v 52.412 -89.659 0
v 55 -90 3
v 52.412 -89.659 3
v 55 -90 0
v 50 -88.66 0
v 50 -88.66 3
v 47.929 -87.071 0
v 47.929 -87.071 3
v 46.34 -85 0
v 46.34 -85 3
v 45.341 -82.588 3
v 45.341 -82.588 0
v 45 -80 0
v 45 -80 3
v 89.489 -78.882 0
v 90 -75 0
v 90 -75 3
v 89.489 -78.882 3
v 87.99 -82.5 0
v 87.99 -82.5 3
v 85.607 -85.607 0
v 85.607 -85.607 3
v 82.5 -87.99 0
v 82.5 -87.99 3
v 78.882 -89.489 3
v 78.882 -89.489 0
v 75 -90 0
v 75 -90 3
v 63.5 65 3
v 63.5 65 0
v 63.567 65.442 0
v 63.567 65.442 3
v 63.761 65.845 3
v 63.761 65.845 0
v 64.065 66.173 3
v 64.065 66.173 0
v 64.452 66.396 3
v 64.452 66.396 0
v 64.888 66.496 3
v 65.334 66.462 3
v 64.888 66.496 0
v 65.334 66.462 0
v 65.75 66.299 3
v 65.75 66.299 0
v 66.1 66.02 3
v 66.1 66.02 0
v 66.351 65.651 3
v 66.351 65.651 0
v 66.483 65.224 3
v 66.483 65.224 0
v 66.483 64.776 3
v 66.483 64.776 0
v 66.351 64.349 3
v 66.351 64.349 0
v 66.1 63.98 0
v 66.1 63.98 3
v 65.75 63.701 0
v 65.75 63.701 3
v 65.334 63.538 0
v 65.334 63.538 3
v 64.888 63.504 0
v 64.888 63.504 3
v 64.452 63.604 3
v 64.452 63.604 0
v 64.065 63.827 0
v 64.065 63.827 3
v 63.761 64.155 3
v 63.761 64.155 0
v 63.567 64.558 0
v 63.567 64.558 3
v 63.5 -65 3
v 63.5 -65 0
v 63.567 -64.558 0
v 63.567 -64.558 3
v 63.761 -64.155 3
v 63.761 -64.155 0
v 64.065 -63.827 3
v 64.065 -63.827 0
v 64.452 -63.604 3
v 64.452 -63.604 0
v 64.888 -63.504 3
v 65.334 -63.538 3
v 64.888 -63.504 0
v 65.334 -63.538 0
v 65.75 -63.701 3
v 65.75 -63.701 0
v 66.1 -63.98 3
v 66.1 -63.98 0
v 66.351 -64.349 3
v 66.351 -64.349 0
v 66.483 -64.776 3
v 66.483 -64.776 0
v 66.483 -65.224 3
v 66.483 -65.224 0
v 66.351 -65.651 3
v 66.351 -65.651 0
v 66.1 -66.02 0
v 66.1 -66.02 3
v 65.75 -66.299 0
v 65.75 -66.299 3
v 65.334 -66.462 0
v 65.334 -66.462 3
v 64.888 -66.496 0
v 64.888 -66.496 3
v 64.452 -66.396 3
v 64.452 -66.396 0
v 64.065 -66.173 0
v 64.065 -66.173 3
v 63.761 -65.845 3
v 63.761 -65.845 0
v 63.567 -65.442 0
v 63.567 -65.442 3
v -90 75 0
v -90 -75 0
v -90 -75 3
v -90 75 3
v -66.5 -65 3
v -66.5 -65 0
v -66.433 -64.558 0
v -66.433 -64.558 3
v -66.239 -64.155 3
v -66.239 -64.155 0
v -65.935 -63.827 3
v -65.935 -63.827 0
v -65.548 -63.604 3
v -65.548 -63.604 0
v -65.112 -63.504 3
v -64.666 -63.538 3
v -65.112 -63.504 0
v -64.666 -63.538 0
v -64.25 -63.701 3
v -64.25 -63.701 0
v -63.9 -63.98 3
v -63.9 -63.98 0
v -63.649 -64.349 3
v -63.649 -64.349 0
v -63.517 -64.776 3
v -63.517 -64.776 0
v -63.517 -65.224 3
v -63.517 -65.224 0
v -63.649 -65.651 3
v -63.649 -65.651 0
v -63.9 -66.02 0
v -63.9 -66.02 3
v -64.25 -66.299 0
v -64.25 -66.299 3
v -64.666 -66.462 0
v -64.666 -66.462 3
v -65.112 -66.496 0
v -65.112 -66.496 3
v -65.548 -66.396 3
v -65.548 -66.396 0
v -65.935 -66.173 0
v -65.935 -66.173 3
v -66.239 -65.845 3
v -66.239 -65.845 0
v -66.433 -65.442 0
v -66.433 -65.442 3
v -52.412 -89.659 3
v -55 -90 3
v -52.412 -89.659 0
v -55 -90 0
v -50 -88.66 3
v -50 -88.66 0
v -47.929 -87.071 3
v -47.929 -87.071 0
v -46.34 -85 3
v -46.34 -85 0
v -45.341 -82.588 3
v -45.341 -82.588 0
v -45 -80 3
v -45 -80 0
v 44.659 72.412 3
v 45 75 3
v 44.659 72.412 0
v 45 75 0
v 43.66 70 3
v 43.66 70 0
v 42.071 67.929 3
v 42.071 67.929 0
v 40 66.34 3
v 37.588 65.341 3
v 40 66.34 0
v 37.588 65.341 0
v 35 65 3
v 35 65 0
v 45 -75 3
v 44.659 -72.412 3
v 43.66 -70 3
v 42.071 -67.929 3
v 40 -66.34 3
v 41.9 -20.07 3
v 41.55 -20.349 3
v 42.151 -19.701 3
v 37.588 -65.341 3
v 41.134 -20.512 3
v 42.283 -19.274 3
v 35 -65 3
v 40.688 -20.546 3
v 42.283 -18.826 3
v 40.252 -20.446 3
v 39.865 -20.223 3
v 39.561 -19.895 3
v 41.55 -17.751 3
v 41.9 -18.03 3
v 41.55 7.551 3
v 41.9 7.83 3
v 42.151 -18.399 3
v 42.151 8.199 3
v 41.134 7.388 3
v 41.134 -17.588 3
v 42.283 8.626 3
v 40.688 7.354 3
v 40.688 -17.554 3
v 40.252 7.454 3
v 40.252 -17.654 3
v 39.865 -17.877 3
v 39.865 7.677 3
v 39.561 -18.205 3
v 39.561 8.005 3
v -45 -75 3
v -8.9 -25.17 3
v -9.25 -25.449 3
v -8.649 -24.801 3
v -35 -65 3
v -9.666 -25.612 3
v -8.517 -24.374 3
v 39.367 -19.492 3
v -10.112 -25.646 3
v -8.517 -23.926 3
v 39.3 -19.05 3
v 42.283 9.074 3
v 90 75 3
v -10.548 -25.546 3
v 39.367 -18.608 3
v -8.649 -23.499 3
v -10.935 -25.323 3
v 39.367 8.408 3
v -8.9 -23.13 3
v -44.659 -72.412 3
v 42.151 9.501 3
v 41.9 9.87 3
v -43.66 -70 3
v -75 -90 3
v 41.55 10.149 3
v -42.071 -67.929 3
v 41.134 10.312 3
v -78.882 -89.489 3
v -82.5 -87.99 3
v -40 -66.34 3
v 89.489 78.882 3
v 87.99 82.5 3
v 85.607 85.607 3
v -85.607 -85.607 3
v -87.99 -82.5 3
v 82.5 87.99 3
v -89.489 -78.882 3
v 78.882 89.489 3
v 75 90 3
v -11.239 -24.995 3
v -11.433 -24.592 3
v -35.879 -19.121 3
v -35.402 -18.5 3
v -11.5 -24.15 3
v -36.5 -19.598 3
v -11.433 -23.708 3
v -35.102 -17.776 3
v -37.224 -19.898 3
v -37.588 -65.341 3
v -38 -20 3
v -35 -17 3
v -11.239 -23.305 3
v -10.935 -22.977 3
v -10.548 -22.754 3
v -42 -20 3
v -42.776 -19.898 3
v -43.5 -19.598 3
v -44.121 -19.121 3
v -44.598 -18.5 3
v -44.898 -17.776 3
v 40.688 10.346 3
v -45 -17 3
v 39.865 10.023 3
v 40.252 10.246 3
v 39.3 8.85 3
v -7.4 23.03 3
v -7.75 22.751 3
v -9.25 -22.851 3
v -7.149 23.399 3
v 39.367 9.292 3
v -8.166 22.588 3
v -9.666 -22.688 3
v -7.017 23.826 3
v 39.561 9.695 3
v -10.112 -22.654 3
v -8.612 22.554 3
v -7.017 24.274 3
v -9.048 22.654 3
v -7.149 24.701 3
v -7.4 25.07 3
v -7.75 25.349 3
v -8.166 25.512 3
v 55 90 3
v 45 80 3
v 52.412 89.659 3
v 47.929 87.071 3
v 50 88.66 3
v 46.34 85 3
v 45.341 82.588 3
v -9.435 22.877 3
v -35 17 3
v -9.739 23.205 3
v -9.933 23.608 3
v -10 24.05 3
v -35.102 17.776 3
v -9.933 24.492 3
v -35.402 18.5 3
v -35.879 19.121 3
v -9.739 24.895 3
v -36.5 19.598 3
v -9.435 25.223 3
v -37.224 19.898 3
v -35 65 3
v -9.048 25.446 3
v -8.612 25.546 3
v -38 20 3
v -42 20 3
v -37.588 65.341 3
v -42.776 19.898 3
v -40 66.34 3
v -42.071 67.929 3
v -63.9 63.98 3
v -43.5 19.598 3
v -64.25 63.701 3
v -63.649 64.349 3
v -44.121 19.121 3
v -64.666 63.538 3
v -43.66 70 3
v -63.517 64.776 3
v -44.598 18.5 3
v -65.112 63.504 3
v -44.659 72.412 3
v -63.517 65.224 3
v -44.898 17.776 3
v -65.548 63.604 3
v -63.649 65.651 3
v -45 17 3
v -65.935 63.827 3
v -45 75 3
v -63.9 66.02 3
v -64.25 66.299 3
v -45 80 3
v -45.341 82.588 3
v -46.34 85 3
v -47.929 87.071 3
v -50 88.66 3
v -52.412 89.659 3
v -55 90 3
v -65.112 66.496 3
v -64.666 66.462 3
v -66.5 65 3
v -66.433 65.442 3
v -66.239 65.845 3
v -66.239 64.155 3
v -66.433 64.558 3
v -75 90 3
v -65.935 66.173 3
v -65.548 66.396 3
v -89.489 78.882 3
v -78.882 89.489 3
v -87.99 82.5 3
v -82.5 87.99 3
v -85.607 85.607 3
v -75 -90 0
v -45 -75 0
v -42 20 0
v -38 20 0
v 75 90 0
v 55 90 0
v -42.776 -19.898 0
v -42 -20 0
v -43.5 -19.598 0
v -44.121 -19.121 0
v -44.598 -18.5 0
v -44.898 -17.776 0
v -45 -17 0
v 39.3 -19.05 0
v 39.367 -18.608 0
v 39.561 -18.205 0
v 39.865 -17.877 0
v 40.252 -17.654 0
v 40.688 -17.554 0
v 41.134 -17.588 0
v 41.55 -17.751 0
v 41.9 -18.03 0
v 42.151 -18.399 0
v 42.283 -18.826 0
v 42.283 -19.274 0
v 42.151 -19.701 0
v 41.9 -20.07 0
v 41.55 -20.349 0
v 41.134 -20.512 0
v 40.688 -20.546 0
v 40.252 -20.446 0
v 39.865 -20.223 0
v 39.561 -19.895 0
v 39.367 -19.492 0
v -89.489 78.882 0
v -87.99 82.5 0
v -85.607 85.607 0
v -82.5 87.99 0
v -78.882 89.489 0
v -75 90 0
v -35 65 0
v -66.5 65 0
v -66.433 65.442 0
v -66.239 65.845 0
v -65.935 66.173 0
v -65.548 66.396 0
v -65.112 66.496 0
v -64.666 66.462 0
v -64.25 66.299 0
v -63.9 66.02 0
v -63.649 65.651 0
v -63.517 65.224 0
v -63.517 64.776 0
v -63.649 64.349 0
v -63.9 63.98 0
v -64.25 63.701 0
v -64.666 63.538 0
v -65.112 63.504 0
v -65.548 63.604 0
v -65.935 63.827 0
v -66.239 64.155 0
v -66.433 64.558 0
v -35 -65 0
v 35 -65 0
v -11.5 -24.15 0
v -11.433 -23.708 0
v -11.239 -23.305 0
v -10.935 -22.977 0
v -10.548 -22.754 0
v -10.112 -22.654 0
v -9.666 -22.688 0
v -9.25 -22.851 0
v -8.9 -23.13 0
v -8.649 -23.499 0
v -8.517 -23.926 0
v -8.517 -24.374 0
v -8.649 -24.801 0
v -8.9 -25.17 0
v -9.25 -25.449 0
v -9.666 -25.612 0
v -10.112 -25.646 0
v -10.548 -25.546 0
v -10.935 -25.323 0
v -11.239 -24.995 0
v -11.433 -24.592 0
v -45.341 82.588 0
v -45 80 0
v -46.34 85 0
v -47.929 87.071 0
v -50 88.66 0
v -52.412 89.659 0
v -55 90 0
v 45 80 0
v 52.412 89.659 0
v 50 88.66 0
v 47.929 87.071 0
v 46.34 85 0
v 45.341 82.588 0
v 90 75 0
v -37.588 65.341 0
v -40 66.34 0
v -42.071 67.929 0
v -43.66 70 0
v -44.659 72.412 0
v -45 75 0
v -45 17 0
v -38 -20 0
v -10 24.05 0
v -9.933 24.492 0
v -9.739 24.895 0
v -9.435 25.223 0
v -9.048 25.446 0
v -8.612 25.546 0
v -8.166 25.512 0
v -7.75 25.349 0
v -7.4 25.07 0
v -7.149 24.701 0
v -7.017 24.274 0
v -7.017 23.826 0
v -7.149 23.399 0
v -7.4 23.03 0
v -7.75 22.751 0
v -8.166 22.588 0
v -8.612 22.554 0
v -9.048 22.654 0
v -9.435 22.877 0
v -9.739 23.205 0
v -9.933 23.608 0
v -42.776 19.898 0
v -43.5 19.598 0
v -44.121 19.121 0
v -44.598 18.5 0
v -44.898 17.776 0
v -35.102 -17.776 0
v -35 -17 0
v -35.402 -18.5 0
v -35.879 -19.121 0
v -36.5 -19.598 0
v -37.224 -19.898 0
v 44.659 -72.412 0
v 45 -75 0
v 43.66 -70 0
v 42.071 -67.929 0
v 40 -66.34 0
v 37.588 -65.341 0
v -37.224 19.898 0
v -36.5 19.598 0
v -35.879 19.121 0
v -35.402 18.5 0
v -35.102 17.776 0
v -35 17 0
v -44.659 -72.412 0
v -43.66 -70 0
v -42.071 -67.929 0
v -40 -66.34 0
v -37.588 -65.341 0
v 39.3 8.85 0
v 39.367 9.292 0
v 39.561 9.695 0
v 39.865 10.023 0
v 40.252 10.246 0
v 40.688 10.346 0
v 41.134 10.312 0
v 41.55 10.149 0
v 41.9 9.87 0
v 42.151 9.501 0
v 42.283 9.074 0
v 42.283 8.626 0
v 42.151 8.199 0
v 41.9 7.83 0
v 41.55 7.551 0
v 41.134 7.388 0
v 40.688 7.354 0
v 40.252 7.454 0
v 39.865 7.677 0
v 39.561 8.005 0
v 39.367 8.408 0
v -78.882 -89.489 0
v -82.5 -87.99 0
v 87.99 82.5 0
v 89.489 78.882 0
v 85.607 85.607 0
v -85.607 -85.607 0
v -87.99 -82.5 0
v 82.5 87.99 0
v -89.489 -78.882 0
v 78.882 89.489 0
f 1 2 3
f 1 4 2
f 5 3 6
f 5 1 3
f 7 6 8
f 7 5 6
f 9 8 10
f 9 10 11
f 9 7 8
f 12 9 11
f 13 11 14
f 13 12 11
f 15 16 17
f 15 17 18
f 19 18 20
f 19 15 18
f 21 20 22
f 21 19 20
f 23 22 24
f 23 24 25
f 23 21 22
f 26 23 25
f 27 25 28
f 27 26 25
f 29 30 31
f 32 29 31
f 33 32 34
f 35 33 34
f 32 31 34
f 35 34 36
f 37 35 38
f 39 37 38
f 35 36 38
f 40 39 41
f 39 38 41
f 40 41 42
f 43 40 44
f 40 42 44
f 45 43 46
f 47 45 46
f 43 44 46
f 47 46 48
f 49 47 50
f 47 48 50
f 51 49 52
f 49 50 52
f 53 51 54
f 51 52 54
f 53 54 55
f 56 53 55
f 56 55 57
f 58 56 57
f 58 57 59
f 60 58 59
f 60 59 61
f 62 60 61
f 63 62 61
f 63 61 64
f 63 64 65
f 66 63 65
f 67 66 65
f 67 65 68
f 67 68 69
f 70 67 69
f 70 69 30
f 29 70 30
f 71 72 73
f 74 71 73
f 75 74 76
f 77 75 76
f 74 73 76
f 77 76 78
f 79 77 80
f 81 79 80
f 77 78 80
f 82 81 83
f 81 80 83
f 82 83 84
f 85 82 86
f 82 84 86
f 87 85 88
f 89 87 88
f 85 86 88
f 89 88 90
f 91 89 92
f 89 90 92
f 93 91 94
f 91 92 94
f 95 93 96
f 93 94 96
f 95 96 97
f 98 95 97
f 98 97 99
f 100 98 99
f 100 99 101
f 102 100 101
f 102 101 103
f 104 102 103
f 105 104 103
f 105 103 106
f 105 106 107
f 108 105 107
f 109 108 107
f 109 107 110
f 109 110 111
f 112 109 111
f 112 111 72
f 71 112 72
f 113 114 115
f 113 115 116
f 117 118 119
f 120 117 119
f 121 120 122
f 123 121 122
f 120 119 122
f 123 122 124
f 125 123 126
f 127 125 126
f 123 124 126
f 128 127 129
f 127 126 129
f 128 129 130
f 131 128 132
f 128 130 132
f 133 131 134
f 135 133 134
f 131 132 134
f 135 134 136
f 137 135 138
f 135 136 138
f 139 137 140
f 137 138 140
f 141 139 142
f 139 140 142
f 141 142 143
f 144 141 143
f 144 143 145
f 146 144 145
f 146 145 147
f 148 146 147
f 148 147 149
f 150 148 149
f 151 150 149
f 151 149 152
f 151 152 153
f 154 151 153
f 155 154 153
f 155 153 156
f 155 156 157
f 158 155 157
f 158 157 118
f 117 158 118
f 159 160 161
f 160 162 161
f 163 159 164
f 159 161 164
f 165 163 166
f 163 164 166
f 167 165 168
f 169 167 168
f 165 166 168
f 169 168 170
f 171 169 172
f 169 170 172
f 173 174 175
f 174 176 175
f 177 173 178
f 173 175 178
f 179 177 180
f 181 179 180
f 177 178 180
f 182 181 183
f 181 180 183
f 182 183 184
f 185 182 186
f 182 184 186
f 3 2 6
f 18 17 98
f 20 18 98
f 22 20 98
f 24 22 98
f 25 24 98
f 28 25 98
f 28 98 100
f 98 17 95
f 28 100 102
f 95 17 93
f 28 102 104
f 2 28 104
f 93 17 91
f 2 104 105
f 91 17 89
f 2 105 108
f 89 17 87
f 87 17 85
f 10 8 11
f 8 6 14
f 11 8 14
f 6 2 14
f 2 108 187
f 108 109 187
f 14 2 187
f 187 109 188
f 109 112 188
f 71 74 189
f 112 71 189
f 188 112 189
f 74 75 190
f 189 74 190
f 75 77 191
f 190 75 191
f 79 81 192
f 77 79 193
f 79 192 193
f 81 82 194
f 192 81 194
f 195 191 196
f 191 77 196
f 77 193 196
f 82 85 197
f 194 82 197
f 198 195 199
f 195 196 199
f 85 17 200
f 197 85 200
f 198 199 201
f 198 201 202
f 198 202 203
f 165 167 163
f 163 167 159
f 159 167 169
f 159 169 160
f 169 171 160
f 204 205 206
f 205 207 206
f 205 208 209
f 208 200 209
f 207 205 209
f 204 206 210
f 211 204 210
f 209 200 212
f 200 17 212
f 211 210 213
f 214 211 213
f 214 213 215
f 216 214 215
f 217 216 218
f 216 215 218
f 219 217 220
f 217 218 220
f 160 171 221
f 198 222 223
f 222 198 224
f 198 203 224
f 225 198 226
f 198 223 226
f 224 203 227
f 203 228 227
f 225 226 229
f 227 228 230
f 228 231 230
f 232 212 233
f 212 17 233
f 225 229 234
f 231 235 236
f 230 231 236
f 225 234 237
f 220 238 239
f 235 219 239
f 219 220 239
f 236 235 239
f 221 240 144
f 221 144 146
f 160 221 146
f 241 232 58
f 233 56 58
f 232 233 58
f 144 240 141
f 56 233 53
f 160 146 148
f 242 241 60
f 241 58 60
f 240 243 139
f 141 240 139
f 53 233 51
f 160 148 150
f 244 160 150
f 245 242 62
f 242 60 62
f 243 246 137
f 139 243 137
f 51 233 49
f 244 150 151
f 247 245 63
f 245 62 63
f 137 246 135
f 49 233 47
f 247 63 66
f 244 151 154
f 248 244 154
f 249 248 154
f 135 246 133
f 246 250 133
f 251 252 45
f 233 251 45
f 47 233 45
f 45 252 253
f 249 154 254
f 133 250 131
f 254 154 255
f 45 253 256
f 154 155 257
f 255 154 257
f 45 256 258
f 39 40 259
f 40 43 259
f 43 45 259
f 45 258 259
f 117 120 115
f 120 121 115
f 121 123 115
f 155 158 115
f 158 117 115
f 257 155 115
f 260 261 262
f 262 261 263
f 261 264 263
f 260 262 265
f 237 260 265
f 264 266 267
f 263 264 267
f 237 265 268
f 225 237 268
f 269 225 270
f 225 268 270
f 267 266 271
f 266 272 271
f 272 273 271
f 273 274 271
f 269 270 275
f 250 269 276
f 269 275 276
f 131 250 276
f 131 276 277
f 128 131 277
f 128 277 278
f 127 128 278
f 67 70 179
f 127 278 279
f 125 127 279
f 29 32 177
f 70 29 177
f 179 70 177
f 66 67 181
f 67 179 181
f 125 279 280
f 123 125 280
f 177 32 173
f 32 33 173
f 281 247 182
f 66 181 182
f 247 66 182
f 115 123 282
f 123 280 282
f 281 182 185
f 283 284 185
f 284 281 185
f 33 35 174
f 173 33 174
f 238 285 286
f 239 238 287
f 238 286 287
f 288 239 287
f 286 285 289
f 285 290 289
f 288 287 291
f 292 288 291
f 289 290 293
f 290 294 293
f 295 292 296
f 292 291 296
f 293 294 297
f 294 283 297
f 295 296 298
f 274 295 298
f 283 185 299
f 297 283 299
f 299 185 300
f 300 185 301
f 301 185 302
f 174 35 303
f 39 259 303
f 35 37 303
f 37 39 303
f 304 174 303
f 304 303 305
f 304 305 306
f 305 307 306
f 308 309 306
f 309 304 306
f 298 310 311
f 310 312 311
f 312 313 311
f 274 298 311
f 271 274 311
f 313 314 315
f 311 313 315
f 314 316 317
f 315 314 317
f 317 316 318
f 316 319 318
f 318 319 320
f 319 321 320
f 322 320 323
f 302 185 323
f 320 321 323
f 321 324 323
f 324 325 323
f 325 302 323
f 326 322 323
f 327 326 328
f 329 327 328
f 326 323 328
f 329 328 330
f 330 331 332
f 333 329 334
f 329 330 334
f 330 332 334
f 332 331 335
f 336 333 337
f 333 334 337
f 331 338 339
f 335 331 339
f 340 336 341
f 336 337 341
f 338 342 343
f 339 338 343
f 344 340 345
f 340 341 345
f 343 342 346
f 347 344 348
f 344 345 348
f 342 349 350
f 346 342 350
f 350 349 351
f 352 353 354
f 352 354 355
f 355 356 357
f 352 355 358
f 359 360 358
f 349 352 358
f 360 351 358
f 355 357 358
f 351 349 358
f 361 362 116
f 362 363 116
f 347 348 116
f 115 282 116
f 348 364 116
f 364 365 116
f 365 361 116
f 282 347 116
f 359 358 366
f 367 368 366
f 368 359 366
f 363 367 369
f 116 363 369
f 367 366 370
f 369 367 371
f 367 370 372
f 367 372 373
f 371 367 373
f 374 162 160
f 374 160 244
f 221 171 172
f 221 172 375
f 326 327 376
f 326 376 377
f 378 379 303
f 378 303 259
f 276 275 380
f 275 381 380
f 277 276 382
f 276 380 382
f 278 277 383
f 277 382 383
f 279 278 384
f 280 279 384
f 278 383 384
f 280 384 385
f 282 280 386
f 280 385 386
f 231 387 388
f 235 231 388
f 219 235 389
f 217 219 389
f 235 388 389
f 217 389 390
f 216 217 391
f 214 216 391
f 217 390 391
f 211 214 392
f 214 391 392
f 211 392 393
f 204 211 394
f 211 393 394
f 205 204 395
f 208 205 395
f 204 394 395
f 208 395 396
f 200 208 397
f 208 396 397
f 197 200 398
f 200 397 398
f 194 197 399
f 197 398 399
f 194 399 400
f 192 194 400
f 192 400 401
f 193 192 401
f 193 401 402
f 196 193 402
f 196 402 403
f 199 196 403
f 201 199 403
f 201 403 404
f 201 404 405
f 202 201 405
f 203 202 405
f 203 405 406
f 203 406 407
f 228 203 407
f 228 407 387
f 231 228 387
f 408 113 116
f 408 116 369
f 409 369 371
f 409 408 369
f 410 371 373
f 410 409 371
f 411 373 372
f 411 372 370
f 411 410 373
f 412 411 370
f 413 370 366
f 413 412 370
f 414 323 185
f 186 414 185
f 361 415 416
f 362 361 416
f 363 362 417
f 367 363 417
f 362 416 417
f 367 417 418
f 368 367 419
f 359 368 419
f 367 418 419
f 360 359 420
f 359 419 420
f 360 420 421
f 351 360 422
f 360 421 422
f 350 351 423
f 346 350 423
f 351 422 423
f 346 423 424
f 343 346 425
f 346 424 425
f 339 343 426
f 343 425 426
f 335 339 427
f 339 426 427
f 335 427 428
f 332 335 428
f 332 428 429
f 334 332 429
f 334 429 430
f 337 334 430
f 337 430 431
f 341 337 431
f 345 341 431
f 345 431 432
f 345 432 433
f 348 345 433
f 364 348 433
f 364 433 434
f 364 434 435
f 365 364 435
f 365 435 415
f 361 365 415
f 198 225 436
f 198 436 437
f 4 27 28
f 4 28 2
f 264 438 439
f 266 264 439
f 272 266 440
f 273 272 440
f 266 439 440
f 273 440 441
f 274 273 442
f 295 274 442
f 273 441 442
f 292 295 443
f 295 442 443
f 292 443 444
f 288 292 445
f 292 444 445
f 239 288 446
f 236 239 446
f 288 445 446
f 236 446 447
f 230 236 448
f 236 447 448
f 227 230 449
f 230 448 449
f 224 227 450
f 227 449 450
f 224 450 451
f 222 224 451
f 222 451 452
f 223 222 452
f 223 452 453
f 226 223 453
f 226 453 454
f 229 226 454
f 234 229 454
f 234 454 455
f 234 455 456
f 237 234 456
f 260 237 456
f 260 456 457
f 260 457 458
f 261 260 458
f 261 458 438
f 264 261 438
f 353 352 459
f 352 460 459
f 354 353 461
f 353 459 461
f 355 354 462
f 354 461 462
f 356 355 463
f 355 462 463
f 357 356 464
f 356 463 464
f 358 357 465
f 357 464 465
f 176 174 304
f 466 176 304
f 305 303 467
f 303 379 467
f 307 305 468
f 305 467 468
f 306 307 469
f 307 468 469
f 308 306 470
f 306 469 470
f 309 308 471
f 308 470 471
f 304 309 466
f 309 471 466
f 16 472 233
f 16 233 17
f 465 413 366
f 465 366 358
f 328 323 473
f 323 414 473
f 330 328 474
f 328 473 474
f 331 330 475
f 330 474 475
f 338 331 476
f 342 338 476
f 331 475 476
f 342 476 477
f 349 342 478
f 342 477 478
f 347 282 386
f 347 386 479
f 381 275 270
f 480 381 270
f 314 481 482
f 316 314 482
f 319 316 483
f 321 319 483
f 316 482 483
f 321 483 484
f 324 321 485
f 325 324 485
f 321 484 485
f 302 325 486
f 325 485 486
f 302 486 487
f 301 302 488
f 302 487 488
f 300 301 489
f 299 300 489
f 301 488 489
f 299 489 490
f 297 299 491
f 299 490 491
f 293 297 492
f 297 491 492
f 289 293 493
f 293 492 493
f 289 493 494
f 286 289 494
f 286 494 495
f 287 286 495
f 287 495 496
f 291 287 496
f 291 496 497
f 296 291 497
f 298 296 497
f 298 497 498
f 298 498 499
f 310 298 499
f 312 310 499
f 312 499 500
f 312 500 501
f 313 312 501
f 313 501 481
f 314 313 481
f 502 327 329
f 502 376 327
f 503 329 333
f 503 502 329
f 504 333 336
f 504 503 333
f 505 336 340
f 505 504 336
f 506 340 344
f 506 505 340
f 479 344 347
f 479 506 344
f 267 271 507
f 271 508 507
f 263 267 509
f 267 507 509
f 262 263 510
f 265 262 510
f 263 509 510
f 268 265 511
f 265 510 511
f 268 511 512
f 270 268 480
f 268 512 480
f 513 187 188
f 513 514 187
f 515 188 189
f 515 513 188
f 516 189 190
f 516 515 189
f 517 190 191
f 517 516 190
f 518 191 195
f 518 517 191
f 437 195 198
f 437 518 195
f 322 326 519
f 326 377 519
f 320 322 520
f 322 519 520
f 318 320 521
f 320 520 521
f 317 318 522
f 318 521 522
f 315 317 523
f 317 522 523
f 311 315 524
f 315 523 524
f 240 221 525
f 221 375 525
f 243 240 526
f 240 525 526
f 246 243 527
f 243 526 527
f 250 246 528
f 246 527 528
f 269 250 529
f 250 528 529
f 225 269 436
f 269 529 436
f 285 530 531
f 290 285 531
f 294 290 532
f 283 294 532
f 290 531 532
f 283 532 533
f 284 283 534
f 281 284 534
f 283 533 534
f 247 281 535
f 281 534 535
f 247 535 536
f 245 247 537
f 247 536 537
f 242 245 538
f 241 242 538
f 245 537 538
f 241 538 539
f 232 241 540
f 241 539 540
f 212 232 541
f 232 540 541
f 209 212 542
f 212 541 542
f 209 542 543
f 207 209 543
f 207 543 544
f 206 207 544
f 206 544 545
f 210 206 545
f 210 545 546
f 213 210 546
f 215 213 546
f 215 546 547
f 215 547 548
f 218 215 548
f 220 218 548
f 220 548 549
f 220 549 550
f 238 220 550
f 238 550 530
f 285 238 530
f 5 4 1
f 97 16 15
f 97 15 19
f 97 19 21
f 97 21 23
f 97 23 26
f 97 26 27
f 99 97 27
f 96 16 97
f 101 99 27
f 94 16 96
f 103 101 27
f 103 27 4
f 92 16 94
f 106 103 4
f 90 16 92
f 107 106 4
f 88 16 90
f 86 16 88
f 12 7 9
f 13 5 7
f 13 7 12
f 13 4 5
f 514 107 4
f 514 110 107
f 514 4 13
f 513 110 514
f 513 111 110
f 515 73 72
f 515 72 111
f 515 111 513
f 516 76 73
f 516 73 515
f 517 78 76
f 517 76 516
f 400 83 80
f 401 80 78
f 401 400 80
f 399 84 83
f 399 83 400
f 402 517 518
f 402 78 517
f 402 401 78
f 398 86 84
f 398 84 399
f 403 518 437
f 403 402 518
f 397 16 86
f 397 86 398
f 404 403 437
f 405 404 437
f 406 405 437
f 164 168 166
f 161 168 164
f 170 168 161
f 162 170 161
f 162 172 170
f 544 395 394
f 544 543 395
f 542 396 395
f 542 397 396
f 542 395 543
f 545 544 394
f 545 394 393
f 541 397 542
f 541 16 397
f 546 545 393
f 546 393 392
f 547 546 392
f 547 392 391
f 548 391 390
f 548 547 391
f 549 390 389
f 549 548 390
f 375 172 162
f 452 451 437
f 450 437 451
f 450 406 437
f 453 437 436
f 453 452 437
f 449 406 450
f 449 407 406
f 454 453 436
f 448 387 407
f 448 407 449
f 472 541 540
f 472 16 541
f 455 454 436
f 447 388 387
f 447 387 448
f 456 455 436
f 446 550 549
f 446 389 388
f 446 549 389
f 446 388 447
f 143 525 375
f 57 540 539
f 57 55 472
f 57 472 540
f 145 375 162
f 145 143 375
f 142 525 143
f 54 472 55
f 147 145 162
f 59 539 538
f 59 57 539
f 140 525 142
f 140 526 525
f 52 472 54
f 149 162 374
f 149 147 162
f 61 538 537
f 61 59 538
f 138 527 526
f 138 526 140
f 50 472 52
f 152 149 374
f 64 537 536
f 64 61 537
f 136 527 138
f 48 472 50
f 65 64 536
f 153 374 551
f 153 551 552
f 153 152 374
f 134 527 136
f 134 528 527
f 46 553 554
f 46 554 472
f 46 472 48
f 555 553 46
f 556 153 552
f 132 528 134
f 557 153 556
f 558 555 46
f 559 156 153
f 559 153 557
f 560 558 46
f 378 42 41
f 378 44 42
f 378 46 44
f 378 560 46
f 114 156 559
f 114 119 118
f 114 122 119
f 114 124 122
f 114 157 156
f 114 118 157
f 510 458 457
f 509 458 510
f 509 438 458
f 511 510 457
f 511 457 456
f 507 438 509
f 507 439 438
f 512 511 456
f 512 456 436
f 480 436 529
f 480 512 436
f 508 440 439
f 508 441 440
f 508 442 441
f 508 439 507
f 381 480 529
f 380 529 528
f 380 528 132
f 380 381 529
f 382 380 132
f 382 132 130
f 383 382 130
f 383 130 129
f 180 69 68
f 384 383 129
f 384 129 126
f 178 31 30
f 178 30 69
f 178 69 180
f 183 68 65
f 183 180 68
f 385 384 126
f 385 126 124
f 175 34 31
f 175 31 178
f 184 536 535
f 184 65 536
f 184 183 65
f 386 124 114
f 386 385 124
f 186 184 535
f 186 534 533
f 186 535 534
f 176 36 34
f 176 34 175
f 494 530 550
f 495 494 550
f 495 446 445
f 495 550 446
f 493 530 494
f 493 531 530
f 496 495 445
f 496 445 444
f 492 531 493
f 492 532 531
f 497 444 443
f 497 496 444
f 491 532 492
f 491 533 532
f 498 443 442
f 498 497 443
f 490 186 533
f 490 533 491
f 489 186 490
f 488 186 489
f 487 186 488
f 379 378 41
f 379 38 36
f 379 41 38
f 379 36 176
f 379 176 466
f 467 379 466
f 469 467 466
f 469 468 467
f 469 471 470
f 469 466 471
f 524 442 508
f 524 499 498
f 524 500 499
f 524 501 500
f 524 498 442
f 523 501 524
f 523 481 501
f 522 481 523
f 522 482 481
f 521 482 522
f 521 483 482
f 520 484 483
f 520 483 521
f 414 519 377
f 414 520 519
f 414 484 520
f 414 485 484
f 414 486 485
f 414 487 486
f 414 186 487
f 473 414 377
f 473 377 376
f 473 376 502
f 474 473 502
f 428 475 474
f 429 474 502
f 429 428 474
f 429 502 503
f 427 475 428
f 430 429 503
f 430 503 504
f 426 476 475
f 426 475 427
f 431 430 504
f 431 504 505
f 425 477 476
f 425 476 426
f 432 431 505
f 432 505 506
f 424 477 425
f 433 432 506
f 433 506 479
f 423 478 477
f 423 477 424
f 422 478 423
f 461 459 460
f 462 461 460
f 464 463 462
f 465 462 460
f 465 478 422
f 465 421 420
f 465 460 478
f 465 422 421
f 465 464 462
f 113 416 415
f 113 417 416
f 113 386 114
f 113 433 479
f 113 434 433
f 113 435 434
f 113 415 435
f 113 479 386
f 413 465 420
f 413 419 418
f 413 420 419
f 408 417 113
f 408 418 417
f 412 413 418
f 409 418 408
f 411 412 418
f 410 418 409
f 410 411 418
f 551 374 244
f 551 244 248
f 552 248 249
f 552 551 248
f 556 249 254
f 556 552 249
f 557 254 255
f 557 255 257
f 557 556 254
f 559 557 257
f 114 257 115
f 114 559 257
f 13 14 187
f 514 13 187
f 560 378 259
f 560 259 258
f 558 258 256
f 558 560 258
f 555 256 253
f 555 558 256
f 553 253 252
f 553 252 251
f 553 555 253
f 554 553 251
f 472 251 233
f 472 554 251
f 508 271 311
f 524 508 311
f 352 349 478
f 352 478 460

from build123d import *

# Parameters (mm, degrees)
EXTRUDE_1_DEPTH       = 3
HOLE_WIZARD_3_0_3_1_D = 3
SKETCH_7_W            = 90
SKETCH_7_H            = 25
CUT_EXTRUDE_1_DEPTH   = 128.314571044
FILLET_7_R            = 10
HOLE_WIZARD_3_0_3_2_D = 3
SKETCH1_W             = 10
SKETCH1_H             = 40
CUT_EXTRUDE1_DEPTH    = 128.314571044
FILLET1_R             = 3


with BuildPart() as part:
    # Эскиз1 → Бобышка-Вытянуть1 (new body)
    with BuildSketch(Plane.XY):
        with BuildLine():
            Line((75, -90), (-75, -90))
            ThreePointArc((-75, -90), (-85.606601718, -85.606601718), (-90, -75))
            Line((-90, -75), (-90, 75))
            ThreePointArc((-90, 75), (-85.606601718, 85.606601718), (-75, 90))
            Line((-75, 90), (75, 90))
            ThreePointArc((75, 90), (85.606601718, 85.606601718), (90, 75))
            Line((90, 75), (90, -75))
            ThreePointArc((90, -75), (85.606601718, -85.606601718), (75, -90))
        make_face()
    extrude(amount=EXTRUDE_1_DEPTH)

    # Диаметр отверстия Ø3.0 (3)1 (through all)
    with Locations(Plane.XY.offset(3)):
        with Locations((-10, -24.15), (40.8, 8.85), (40.8, -19.05), (-8.5, 24.05)):
            Hole(HOLE_WIZARD_3_0_3_1_D / 2)

    # Эскиз7 → Вырез-Вытянуть1 (cut, through all)
    with BuildSketch(Plane.XY.offset(3)):
        with Locations((0, 77.5)):
            Rectangle(SKETCH_7_W, SKETCH_7_H)
        with Locations((0, -77.5)):
            Rectangle(SKETCH_7_W, SKETCH_7_H)
    extrude(amount=-CUT_EXTRUDE_1_DEPTH, mode=Mode.SUBTRACT)

    # Скругление7
    fillet_7_edges = [part.edges().sort_by_distance(p)[0] for p in [
        (-45, 65, 1.5),
        (-45, 90, 1.5),
        (45, 90, 1.5),
        (45, 65, 1.5),
        (-45, -90, 1.5),
        (-45, -65, 1.5),
        (45, -65, 1.5),
        (45, -90, 1.5),
    ]]
    fillet(fillet_7_edges, radius=FILLET_7_R)

    # Диаметр отверстия Ø3.0 (3)2 (through all)
    with Locations(Plane.XY.offset(3)):
        with Locations((-65, -65), (65, -65), (65, 65), (-65, 65)):
            Hole(HOLE_WIZARD_3_0_3_2_D / 2)

    # Sketch1 → Cut-Extrude1 (cut, through all)
    with BuildSketch(Plane.XY.offset(3)):
        with Locations((-40, 0)):
            Rectangle(SKETCH1_W, SKETCH1_H)
    extrude(amount=-CUT_EXTRUDE1_DEPTH, mode=Mode.SUBTRACT)

    # Fillet1
    fillet1_edges = [part.edges().sort_by_distance(p)[0] for p in [
        (-35, 20, 1.5),
        (-35, -20, 1.5),
        (-45, -20, 1.5),
        (-45, 20, 1.5),
    ]]
    fillet(fillet1_edges, radius=FILLET1_R)


solid = part.part
